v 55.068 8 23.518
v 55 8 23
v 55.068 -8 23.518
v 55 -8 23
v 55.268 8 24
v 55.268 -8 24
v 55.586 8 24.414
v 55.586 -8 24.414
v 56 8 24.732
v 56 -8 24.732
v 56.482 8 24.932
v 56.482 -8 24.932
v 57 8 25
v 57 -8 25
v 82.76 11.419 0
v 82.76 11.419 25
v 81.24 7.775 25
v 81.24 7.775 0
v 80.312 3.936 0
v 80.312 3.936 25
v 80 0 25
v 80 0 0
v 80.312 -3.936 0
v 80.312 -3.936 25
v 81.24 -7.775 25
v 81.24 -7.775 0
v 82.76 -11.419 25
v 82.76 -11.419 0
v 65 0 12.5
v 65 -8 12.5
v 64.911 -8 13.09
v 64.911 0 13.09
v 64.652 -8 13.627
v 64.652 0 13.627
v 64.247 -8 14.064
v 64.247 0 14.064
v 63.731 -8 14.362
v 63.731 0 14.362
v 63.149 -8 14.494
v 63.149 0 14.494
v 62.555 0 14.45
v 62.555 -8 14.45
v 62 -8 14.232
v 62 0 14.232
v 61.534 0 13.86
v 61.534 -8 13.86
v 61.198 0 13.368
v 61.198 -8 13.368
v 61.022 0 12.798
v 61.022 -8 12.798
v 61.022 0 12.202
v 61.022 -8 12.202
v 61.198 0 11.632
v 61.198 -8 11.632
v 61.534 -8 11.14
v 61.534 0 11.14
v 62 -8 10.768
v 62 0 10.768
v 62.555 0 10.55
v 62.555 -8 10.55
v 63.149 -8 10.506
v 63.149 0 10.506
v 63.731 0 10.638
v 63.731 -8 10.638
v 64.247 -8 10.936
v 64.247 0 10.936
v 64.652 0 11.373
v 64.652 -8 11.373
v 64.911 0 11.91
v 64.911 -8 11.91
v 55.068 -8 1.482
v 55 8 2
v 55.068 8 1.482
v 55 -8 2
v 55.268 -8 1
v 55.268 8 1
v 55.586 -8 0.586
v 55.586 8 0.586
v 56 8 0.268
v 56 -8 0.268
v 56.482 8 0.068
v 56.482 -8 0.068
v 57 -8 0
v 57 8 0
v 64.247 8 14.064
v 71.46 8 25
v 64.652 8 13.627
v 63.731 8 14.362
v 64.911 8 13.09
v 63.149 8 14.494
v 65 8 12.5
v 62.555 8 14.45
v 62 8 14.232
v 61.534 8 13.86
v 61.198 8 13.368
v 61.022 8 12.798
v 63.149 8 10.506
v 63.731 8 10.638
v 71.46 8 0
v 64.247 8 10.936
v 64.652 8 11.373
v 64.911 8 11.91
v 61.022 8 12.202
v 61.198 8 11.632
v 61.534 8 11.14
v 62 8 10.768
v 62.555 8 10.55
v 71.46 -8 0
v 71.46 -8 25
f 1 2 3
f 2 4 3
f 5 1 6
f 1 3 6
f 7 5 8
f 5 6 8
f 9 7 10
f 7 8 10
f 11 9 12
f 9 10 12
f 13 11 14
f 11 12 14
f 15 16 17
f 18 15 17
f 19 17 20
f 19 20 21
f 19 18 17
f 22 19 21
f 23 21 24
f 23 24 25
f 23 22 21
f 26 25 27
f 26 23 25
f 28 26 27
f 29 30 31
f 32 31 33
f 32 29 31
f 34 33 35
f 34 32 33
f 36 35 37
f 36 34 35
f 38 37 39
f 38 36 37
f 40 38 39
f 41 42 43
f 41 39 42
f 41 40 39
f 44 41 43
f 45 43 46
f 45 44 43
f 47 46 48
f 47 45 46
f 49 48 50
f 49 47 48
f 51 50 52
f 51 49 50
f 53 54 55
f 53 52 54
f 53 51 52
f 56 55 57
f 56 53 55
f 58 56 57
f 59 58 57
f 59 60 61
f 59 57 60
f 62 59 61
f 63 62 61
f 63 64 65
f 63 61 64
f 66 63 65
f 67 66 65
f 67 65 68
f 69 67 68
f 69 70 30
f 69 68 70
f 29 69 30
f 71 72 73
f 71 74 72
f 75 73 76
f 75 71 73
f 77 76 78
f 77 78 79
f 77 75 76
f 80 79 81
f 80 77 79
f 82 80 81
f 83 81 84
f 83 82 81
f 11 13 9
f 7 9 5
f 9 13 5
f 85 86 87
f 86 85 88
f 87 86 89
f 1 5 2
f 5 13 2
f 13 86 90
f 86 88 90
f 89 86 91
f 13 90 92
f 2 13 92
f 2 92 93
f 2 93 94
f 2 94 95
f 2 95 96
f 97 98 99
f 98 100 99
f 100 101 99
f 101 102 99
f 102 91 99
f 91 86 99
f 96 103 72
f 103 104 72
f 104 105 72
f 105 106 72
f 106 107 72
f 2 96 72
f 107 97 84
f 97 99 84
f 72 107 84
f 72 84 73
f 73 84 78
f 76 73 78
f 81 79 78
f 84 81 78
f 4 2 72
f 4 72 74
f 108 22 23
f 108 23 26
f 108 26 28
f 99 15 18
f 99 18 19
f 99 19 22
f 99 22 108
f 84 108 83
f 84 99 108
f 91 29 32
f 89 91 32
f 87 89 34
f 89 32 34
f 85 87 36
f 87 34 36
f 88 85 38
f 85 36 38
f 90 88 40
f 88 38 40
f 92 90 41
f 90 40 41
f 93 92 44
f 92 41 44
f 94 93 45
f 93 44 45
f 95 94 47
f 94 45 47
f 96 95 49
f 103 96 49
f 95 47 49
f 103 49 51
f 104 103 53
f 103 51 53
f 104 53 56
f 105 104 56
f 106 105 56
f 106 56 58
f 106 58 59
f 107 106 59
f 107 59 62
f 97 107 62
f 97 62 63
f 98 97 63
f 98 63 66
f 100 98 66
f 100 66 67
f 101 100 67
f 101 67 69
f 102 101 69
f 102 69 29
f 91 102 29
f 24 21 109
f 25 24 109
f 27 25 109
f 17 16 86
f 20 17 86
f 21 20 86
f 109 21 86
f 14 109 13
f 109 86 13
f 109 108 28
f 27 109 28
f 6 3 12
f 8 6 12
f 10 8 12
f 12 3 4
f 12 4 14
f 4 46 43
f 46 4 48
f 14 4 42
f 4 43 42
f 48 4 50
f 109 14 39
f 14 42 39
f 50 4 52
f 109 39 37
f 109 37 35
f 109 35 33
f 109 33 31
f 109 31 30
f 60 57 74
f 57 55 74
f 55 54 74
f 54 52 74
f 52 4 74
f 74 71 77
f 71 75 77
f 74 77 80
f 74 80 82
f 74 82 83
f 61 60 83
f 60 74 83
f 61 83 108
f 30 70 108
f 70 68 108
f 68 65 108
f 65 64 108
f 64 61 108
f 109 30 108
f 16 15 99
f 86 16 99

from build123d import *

# Parameters (mm, degrees)
PAD004_DEPTH         = 25
FILLET005_R          = 2
SKETCH009_R          = 2
POCKET004_DEPTH      = 11.420051
POCKET004_DEPTH_BACK = 11.420051


with BuildPart() as part:
    # Sketch008 → Pad004 (new body)
    with BuildSketch(Plane.XY):
        with BuildLine():
            ThreePointArc((-7.239723, 11.419051), (-10, 0), (-7.239723, -11.419051))
            Line((-18.540393, -8), (-7.239723, -11.419051))
            Line((-35, -8), (-18.540393, -8))
            Line((-35, 8), (-35, -8))
            Line((-18.540393, 8), (-35, 8))
            Line((-7.239723, 11.419051), (-18.540393, 8))
        make_face()
    extrude(amount=PAD004_DEPTH)

    # Fillet005
    fillet005_edges = [part.edges().sort_by_distance(p)[0] for p in [
        (-35, 0, 25),
        (-35, 0, 0),
    ]]
    fillet(fillet005_edges, radius=FILLET005_R)

    # Sketch009 → Pocket004 (cut, two sides)
    with BuildSketch(Plane.XZ) as pocket004_sk:
        with Locations((-27, 12.5)):
            Circle(SKETCH009_R)
    extrude(amount=-POCKET004_DEPTH, mode=Mode.SUBTRACT)
    extrude(pocket004_sk.sketch, amount=POCKET004_DEPTH_BACK, mode=Mode.SUBTRACT)


with BuildPart() as part_1:
    # Body004 placement: moved
    add(part.part.moved(Location((90, 0, 0))))


solid = part_1.part
